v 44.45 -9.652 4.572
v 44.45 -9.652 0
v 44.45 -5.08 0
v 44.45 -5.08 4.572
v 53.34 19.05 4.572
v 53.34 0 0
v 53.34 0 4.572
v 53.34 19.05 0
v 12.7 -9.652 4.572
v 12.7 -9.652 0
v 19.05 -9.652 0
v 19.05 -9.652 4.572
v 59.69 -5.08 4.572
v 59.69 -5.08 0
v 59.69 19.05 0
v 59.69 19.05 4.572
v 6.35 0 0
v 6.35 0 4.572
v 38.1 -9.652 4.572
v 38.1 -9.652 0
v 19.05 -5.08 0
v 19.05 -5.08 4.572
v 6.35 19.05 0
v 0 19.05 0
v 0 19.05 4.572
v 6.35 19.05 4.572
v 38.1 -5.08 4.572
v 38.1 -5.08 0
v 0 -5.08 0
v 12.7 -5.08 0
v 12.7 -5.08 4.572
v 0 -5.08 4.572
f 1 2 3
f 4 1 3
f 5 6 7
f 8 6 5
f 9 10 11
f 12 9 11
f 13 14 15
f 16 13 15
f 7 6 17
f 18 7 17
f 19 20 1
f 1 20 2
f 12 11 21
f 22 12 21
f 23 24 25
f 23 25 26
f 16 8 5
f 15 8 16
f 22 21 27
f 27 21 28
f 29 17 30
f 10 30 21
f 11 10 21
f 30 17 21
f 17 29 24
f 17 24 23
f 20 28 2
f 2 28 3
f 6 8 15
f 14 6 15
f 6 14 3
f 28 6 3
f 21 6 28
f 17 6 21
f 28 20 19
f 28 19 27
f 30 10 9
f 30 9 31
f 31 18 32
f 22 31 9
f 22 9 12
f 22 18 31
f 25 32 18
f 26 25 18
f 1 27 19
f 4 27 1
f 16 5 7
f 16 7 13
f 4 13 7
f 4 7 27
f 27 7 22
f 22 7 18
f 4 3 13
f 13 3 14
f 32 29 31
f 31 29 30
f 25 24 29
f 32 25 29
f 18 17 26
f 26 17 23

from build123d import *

# Parameters (mm, degrees)
SKETCH1_W           = 6.35
SKETCH1_H           = 19.05
SKETCH1_H_2         = 4.572
BOSS_EXTRUDE1_DEPTH = 4.572


with BuildPart() as part:
    # Sketch1 → Boss-Extrude1 (new body)
    with BuildSketch(Plane.XY):
        Polygon((19.05, -5.08), (29.845, -5.08), (29.845, 0), (6.35, 0), (0, 0), (0, -5.08), (12.7, -5.08), align=None)
        with Locations((3.175, 9.525)):
            Rectangle(SKETCH1_W, SKETCH1_H)
        with Locations((15.875, -7.366)):
            Rectangle(SKETCH1_W, SKETCH1_H_2)
        Polygon((29.845, 0), (29.845, -5.08), (38.1, -5.08), (44.45, -5.08), (59.69, -5.08), (59.69, 0), (53.34, 0), align=None)
        with Locations((56.515, 9.525)):
            Rectangle(SKETCH1_W, SKETCH1_H)
        with Locations((41.275, -7.366)):
            Rectangle(SKETCH1_W, SKETCH1_H_2)
    extrude(amount=BOSS_EXTRUDE1_DEPTH)


solid = part.part
